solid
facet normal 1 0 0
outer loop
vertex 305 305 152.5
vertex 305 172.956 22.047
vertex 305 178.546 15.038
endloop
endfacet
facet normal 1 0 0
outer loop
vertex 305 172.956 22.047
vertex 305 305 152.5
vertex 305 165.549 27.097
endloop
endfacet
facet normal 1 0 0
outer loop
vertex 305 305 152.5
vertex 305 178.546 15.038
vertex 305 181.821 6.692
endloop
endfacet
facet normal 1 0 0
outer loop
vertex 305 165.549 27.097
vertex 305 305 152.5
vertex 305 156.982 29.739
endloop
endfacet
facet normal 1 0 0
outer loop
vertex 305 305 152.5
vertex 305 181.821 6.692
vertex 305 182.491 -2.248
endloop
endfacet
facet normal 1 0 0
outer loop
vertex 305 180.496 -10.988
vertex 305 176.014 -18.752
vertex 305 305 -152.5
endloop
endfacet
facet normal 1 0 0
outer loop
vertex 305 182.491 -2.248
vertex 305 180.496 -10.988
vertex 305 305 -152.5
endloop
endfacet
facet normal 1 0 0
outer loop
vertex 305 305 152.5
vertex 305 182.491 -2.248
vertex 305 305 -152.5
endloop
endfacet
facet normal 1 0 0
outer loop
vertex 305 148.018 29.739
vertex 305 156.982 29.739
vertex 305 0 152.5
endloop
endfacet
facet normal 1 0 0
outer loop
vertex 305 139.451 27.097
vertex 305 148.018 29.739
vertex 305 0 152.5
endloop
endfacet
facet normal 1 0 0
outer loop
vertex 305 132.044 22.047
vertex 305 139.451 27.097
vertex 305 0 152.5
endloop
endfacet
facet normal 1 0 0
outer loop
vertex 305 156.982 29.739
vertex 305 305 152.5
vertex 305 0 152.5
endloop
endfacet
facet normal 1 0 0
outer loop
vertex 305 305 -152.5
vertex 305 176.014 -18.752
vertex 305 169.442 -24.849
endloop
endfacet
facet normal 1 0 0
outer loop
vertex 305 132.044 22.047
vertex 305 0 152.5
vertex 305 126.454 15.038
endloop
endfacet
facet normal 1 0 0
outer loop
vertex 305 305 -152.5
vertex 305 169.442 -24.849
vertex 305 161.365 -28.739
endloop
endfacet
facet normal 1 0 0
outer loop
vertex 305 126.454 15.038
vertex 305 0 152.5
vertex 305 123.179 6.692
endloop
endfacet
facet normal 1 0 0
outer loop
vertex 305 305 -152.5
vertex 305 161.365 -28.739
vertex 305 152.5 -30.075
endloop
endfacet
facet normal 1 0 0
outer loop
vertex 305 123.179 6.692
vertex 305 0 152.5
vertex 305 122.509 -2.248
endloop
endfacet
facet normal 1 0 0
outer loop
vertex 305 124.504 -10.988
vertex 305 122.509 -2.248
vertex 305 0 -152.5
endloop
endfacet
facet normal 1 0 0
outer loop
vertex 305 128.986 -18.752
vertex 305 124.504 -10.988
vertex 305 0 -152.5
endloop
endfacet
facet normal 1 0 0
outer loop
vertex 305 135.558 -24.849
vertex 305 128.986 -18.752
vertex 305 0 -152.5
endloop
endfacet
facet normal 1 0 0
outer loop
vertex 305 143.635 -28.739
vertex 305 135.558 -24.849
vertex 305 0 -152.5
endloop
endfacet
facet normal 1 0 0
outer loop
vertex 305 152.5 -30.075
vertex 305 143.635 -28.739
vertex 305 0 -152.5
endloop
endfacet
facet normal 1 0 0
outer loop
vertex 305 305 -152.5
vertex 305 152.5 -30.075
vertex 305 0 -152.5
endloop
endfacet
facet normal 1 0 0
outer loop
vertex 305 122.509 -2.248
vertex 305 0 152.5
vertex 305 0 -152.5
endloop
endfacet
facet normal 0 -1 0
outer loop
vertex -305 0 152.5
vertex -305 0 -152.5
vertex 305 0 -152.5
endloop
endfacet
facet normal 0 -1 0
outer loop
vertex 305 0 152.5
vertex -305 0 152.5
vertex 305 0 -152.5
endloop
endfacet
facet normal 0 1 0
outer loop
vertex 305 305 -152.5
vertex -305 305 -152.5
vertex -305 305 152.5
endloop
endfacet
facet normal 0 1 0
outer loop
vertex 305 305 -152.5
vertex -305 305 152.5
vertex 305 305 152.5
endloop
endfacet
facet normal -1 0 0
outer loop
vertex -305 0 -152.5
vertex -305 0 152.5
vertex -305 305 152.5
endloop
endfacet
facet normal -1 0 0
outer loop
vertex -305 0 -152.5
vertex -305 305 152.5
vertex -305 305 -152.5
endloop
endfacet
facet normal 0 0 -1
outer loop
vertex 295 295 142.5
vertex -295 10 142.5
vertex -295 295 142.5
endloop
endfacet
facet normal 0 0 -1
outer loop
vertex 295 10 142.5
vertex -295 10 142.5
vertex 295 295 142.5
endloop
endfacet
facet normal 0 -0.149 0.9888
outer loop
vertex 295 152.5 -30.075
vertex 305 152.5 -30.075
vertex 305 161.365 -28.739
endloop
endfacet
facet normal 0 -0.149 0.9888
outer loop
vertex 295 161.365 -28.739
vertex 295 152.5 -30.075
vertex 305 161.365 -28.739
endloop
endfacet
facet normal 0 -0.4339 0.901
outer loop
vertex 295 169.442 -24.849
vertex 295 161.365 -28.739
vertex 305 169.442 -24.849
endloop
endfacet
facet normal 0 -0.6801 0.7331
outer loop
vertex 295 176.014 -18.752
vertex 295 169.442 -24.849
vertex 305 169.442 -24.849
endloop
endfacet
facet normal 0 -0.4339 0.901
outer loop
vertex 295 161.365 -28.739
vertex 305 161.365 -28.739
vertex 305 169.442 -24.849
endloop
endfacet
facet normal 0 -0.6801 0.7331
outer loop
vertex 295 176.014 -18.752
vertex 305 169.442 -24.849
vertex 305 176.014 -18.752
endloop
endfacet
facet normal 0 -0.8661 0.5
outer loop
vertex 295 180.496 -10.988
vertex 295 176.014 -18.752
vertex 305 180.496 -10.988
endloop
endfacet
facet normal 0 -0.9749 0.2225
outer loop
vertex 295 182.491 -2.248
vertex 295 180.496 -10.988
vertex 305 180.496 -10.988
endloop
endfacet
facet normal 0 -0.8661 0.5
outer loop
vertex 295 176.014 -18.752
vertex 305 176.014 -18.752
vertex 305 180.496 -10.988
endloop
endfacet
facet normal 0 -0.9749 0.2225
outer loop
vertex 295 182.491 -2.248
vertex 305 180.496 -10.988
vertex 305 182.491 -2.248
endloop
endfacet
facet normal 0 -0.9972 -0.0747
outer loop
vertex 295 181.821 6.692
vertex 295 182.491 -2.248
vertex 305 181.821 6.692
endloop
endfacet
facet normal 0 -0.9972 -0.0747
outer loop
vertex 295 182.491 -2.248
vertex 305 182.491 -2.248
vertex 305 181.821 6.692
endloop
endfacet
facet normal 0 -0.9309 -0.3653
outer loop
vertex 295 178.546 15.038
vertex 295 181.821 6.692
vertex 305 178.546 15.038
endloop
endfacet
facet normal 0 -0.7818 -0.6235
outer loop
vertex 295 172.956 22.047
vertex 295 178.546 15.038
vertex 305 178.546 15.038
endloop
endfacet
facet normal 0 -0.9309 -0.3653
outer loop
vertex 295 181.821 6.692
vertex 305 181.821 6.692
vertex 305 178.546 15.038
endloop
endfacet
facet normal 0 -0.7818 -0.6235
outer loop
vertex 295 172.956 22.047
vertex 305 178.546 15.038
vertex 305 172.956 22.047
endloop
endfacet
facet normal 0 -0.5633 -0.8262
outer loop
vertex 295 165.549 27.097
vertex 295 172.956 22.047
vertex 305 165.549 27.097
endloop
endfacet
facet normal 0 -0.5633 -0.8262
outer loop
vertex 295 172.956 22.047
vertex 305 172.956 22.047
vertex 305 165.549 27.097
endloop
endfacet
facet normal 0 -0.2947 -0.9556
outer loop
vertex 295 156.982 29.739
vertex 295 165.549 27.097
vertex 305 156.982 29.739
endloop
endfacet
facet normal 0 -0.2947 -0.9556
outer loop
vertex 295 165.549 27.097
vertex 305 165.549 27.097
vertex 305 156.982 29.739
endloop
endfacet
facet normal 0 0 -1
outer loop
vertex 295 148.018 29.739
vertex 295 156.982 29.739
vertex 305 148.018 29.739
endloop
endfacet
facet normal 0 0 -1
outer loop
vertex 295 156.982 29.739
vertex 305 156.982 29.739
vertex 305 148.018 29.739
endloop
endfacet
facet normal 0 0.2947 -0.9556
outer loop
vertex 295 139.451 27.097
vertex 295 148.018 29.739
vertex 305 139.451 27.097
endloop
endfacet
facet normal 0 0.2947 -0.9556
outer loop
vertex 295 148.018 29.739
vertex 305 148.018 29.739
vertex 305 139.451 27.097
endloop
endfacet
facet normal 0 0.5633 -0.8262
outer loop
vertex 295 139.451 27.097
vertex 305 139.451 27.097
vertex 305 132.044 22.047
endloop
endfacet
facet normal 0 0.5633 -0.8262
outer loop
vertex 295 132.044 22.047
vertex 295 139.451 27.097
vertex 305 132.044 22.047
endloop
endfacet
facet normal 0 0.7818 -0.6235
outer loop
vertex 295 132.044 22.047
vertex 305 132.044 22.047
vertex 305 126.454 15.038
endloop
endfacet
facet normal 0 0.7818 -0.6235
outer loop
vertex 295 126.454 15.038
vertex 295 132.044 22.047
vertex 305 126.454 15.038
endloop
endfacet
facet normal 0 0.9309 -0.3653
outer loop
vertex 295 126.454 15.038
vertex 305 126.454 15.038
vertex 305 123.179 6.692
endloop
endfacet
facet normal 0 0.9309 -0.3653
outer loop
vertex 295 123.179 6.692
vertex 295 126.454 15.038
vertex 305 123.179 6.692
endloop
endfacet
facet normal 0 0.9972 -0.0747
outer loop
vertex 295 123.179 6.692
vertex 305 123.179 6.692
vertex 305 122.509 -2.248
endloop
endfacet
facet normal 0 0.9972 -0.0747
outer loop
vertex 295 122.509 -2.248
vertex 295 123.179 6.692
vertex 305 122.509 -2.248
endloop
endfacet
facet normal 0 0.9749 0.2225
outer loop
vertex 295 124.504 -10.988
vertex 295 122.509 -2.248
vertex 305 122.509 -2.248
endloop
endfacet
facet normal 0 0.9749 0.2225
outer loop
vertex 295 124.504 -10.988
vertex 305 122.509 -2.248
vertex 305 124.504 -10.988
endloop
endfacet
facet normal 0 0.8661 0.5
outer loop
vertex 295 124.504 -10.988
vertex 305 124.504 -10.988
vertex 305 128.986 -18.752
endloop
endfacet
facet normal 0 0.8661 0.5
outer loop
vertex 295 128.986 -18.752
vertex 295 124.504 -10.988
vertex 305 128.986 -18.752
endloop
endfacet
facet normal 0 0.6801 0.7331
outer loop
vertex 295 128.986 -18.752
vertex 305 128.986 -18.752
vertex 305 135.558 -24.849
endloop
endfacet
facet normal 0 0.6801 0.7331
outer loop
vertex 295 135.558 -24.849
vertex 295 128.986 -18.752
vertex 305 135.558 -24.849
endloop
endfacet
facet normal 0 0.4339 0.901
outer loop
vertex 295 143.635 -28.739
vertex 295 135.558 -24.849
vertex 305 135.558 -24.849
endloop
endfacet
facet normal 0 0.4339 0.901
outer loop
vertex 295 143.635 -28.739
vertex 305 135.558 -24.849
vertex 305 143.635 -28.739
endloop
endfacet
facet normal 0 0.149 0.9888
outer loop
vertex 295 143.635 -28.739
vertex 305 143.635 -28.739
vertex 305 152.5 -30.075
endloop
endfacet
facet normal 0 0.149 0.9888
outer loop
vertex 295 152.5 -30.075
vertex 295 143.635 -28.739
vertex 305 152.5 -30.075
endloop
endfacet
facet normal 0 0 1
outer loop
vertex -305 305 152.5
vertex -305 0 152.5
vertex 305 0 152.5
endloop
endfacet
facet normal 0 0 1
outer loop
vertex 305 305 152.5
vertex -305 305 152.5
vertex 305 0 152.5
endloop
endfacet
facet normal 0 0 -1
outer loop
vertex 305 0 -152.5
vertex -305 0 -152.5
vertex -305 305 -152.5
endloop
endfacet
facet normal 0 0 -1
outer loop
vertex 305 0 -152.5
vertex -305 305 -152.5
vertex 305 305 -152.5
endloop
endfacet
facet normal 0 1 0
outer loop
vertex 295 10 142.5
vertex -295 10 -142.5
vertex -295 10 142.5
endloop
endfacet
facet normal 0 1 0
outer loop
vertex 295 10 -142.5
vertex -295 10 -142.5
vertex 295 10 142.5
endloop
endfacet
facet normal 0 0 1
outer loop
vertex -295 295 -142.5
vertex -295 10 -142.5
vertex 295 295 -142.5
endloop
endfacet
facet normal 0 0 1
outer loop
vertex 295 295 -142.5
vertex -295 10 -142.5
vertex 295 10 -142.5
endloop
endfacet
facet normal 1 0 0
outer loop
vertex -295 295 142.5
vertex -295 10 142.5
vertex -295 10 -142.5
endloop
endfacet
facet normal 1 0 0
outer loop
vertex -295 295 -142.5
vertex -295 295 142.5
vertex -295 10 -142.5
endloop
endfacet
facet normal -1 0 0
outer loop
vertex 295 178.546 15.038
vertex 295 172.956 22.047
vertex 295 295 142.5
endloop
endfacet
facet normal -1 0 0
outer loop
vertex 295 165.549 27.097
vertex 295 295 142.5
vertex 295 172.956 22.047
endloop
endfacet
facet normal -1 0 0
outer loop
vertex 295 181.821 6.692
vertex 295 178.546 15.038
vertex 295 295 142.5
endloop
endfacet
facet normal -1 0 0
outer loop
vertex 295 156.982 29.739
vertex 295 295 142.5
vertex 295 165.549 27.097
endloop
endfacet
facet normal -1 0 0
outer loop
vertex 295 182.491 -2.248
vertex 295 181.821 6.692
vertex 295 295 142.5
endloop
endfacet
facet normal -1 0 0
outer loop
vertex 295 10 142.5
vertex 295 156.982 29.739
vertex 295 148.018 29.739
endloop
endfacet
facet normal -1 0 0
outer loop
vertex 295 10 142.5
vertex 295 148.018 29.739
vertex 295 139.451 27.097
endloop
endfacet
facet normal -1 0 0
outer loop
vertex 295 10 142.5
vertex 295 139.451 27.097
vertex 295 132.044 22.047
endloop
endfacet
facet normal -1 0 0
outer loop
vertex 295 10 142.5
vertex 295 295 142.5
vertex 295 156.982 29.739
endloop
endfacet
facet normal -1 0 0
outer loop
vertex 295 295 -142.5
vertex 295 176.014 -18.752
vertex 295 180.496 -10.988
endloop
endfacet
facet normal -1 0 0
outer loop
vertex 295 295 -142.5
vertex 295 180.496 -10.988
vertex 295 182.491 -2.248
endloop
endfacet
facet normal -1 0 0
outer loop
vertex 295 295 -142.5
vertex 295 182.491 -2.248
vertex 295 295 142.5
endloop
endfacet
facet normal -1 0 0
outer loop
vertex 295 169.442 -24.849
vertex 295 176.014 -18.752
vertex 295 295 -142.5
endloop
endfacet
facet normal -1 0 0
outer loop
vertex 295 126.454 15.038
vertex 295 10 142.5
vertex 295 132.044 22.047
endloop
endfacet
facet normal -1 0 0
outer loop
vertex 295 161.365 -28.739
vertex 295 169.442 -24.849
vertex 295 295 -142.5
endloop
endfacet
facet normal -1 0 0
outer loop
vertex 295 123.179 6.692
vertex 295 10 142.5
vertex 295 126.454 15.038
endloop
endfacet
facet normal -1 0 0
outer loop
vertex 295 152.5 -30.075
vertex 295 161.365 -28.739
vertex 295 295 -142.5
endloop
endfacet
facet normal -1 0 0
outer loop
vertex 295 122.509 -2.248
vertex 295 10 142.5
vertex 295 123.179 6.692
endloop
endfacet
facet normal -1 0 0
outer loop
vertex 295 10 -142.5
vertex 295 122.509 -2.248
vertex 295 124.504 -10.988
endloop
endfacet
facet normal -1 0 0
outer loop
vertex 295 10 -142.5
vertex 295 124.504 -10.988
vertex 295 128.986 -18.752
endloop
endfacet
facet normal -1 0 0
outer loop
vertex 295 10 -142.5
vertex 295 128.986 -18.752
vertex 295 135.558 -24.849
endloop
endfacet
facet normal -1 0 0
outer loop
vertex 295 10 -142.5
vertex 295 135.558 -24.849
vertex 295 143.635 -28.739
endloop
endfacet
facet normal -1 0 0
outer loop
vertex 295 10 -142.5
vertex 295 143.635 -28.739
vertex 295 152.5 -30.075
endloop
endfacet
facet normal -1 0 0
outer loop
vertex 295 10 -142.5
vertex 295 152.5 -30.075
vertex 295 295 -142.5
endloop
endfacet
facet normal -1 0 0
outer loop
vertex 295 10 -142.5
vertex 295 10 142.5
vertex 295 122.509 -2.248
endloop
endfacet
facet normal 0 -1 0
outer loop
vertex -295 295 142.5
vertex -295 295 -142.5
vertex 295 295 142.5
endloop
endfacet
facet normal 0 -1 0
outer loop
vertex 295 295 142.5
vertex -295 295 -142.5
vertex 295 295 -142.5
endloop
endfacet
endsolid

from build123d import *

# Parameters (mm, degrees)
SKETCH1_W           = 610
SKETCH1_H           = 305
BOSS_EXTRUDE1_DEPTH = 305
SHELL1_T            = 10
CUT_EXTRUDE1_REACH  = 612
SKETCH2_R           = 30.075332342


with BuildPart() as part:
    # Sketch1 → Boss-Extrude1 (new body)
    with BuildSketch(Plane(origin=(0, 0, 0), x_dir=(1, 0, 0), z_dir=(0, 1, 0))):
        Rectangle(SKETCH1_W, SKETCH1_H)
    extrude(amount=BOSS_EXTRUDE1_DEPTH)

    # Shell1 (no face opened: a closed hollow body)
    add(offset(amount=-SHELL1_T, mode=Mode.PRIVATE), mode=Mode.SUBTRACT)

    # Sketch2 → Cut-Extrude1 (cut, up to next)
    with BuildSketch(Plane(origin=(305, 0, 0), x_dir=(0, 0, -1), z_dir=(1, 0, 0)), mode=Mode.PRIVATE) as cut_extrude1_sk1:
        with Locations((0, 152.5)):
            Circle(SKETCH2_R)
    cut_extrude1_tool1 = extrude(cut_extrude1_sk1.sketch, amount=-CUT_EXTRUDE1_REACH, mode=Mode.PRIVATE) & part.part
    add(cut_extrude1_tool1.solids().sort_by_distance((305, 152.5, 0))[0], mode=Mode.SUBTRACT)


solid = part.part
